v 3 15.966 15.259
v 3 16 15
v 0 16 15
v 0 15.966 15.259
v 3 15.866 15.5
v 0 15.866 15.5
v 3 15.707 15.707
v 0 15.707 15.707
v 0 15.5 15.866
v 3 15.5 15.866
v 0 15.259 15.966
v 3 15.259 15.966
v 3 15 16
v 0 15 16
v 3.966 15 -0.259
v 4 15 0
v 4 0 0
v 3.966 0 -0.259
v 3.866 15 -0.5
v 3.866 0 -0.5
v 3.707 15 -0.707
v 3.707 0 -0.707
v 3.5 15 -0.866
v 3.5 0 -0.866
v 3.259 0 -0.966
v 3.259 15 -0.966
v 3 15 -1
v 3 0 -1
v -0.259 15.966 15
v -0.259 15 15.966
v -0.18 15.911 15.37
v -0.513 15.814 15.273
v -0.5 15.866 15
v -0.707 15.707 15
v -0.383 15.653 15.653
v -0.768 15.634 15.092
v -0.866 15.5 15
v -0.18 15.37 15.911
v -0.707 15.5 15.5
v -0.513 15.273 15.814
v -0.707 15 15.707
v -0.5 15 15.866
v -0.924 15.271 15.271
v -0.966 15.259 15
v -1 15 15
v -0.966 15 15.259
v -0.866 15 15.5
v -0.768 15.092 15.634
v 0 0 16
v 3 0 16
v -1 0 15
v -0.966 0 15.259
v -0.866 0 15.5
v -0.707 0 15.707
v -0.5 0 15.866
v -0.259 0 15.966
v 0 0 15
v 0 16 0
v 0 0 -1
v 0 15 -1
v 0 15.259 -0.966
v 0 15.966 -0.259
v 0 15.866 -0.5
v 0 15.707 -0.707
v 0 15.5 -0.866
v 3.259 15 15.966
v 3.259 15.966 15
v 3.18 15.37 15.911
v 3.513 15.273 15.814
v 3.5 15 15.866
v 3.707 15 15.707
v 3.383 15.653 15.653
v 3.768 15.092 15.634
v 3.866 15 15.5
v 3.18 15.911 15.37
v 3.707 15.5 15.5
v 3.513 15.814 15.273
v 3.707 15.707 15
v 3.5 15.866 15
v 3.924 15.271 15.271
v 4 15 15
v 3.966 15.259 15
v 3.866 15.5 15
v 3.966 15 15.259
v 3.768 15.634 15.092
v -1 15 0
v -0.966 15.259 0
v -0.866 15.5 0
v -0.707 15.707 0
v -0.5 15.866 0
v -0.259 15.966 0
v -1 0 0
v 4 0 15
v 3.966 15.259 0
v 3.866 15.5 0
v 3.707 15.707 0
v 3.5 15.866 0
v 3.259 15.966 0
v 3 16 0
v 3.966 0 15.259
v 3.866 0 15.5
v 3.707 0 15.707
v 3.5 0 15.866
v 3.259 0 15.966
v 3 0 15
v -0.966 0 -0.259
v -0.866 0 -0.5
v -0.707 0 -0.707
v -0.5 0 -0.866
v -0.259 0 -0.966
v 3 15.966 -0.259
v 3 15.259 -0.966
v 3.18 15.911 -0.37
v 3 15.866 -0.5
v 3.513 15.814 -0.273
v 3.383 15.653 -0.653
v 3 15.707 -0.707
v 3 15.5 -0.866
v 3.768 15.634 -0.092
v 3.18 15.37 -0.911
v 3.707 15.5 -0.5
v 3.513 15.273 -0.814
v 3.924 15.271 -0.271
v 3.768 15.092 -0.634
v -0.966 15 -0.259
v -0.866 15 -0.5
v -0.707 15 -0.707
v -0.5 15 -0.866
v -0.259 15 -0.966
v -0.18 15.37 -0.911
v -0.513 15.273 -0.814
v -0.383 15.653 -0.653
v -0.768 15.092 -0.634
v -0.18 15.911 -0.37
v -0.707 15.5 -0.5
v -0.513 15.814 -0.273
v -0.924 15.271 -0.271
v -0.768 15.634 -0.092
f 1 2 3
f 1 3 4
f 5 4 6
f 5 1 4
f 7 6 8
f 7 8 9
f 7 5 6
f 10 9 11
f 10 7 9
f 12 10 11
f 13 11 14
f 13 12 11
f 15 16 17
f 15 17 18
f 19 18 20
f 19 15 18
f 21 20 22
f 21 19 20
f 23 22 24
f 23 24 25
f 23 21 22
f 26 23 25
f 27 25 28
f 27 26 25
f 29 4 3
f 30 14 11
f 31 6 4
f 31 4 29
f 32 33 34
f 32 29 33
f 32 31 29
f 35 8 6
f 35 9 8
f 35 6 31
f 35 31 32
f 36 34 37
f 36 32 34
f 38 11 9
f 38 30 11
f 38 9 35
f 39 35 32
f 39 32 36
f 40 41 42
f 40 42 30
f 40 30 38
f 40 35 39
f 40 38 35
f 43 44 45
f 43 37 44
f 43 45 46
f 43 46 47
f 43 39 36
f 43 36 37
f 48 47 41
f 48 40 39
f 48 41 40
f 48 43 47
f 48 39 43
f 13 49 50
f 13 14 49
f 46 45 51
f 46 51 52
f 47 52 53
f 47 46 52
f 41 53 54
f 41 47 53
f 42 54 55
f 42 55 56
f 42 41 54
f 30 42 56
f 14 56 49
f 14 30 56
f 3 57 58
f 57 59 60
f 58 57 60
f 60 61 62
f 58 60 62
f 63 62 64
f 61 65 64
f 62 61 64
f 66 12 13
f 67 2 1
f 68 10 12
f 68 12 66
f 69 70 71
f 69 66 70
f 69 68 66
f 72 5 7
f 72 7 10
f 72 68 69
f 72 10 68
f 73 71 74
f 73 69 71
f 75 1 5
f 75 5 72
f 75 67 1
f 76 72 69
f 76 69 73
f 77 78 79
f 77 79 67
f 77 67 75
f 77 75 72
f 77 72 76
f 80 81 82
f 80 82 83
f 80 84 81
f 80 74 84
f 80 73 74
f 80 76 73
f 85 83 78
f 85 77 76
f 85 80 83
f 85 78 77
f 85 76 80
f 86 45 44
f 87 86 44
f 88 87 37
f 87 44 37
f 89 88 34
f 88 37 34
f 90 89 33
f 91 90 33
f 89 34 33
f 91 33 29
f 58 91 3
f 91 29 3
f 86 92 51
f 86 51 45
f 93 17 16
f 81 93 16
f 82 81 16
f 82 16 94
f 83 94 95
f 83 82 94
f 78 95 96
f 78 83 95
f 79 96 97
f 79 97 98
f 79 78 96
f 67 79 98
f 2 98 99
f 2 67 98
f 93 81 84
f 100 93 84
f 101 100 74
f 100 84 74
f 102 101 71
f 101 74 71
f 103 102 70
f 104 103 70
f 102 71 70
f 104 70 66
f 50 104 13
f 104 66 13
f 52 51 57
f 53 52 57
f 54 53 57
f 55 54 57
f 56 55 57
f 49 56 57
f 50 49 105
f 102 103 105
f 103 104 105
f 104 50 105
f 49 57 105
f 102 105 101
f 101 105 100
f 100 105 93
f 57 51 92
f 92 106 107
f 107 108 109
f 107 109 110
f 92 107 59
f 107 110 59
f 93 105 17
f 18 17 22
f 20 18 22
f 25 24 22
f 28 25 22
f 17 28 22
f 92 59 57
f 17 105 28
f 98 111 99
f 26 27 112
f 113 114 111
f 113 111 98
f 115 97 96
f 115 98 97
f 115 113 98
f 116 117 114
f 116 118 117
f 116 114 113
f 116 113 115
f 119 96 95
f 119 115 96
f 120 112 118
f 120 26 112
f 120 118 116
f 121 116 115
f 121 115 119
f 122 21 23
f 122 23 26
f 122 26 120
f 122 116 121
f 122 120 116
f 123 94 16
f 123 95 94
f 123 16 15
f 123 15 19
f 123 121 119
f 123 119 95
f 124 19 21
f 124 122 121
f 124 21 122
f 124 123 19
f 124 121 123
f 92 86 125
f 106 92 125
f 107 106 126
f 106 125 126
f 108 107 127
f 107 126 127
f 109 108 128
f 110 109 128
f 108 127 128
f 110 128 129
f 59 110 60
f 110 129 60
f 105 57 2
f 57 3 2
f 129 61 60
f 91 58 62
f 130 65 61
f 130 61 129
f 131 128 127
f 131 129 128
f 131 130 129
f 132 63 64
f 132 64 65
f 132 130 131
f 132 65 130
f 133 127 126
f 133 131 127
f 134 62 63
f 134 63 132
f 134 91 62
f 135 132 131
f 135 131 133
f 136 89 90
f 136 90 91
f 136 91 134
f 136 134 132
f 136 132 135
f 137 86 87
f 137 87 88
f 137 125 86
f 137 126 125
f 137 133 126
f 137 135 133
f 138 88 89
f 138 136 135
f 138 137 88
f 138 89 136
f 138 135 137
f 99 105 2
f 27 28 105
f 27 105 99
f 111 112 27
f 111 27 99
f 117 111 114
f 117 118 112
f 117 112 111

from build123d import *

# Parameters (mm, degrees)
SKETCH_W           = 3
SKETCH_H           = 15
PAD_DEPTH          = 15
THICKNESS_T        = 1
THICKNESS_FACE2_W  = 3
THICKNESS_FACE2_H  = 15
POCKET_DEPTH       = 5
POCKET_FACE4_W     = 15
POCKET_FACE4_H     = 3
POCKET001_DEPTH    = 5
POCKET001_FACE18_W = 3
POCKET001_FACE18_H = 1
POCKET002_DEPTH    = 5


with BuildPart() as part:
    # Sketch → Pad (new body)
    with BuildSketch(Plane.XY):
        with Locations((1.5, 7.5)):
            Rectangle(SKETCH_W, SKETCH_H)
    extrude(amount=PAD_DEPTH)

    # Thickness
    thickness_openings = [part.faces().sort_by_distance(p)[0] for p in [
        (1.5, 0, 7.5),
    ]]
    offset(amount=THICKNESS_T, openings=thickness_openings)

    # Thickness Face2 → Pocket (cut)
    with BuildSketch(Plane(origin=(1.5, 15, 7.5), x_dir=(-1, 0, 0), z_dir=(0, -1, 0))):
        Rectangle(THICKNESS_FACE2_W, THICKNESS_FACE2_H)
    extrude(amount=-POCKET_DEPTH, mode=Mode.SUBTRACT)

    # Pocket Face4 → Pocket001 (cut)
    with BuildSketch(Plane(origin=(1.5, 7.5, 0), x_dir=(0, 1, 0), z_dir=(0, 0, 1))):
        Rectangle(POCKET_FACE4_W, POCKET_FACE4_H)
    extrude(amount=-POCKET001_DEPTH, mode=Mode.SUBTRACT)

    # Pocket001 Face18 → Pocket002 (cut)
    with BuildSketch(Plane(origin=(1.5, 15, -0.5), x_dir=(-1, 0, 0), z_dir=(0, -1, 0))):
        Rectangle(POCKET001_FACE18_W, POCKET001_FACE18_H)
    extrude(amount=-POCKET002_DEPTH, mode=Mode.SUBTRACT)


solid = part.part
